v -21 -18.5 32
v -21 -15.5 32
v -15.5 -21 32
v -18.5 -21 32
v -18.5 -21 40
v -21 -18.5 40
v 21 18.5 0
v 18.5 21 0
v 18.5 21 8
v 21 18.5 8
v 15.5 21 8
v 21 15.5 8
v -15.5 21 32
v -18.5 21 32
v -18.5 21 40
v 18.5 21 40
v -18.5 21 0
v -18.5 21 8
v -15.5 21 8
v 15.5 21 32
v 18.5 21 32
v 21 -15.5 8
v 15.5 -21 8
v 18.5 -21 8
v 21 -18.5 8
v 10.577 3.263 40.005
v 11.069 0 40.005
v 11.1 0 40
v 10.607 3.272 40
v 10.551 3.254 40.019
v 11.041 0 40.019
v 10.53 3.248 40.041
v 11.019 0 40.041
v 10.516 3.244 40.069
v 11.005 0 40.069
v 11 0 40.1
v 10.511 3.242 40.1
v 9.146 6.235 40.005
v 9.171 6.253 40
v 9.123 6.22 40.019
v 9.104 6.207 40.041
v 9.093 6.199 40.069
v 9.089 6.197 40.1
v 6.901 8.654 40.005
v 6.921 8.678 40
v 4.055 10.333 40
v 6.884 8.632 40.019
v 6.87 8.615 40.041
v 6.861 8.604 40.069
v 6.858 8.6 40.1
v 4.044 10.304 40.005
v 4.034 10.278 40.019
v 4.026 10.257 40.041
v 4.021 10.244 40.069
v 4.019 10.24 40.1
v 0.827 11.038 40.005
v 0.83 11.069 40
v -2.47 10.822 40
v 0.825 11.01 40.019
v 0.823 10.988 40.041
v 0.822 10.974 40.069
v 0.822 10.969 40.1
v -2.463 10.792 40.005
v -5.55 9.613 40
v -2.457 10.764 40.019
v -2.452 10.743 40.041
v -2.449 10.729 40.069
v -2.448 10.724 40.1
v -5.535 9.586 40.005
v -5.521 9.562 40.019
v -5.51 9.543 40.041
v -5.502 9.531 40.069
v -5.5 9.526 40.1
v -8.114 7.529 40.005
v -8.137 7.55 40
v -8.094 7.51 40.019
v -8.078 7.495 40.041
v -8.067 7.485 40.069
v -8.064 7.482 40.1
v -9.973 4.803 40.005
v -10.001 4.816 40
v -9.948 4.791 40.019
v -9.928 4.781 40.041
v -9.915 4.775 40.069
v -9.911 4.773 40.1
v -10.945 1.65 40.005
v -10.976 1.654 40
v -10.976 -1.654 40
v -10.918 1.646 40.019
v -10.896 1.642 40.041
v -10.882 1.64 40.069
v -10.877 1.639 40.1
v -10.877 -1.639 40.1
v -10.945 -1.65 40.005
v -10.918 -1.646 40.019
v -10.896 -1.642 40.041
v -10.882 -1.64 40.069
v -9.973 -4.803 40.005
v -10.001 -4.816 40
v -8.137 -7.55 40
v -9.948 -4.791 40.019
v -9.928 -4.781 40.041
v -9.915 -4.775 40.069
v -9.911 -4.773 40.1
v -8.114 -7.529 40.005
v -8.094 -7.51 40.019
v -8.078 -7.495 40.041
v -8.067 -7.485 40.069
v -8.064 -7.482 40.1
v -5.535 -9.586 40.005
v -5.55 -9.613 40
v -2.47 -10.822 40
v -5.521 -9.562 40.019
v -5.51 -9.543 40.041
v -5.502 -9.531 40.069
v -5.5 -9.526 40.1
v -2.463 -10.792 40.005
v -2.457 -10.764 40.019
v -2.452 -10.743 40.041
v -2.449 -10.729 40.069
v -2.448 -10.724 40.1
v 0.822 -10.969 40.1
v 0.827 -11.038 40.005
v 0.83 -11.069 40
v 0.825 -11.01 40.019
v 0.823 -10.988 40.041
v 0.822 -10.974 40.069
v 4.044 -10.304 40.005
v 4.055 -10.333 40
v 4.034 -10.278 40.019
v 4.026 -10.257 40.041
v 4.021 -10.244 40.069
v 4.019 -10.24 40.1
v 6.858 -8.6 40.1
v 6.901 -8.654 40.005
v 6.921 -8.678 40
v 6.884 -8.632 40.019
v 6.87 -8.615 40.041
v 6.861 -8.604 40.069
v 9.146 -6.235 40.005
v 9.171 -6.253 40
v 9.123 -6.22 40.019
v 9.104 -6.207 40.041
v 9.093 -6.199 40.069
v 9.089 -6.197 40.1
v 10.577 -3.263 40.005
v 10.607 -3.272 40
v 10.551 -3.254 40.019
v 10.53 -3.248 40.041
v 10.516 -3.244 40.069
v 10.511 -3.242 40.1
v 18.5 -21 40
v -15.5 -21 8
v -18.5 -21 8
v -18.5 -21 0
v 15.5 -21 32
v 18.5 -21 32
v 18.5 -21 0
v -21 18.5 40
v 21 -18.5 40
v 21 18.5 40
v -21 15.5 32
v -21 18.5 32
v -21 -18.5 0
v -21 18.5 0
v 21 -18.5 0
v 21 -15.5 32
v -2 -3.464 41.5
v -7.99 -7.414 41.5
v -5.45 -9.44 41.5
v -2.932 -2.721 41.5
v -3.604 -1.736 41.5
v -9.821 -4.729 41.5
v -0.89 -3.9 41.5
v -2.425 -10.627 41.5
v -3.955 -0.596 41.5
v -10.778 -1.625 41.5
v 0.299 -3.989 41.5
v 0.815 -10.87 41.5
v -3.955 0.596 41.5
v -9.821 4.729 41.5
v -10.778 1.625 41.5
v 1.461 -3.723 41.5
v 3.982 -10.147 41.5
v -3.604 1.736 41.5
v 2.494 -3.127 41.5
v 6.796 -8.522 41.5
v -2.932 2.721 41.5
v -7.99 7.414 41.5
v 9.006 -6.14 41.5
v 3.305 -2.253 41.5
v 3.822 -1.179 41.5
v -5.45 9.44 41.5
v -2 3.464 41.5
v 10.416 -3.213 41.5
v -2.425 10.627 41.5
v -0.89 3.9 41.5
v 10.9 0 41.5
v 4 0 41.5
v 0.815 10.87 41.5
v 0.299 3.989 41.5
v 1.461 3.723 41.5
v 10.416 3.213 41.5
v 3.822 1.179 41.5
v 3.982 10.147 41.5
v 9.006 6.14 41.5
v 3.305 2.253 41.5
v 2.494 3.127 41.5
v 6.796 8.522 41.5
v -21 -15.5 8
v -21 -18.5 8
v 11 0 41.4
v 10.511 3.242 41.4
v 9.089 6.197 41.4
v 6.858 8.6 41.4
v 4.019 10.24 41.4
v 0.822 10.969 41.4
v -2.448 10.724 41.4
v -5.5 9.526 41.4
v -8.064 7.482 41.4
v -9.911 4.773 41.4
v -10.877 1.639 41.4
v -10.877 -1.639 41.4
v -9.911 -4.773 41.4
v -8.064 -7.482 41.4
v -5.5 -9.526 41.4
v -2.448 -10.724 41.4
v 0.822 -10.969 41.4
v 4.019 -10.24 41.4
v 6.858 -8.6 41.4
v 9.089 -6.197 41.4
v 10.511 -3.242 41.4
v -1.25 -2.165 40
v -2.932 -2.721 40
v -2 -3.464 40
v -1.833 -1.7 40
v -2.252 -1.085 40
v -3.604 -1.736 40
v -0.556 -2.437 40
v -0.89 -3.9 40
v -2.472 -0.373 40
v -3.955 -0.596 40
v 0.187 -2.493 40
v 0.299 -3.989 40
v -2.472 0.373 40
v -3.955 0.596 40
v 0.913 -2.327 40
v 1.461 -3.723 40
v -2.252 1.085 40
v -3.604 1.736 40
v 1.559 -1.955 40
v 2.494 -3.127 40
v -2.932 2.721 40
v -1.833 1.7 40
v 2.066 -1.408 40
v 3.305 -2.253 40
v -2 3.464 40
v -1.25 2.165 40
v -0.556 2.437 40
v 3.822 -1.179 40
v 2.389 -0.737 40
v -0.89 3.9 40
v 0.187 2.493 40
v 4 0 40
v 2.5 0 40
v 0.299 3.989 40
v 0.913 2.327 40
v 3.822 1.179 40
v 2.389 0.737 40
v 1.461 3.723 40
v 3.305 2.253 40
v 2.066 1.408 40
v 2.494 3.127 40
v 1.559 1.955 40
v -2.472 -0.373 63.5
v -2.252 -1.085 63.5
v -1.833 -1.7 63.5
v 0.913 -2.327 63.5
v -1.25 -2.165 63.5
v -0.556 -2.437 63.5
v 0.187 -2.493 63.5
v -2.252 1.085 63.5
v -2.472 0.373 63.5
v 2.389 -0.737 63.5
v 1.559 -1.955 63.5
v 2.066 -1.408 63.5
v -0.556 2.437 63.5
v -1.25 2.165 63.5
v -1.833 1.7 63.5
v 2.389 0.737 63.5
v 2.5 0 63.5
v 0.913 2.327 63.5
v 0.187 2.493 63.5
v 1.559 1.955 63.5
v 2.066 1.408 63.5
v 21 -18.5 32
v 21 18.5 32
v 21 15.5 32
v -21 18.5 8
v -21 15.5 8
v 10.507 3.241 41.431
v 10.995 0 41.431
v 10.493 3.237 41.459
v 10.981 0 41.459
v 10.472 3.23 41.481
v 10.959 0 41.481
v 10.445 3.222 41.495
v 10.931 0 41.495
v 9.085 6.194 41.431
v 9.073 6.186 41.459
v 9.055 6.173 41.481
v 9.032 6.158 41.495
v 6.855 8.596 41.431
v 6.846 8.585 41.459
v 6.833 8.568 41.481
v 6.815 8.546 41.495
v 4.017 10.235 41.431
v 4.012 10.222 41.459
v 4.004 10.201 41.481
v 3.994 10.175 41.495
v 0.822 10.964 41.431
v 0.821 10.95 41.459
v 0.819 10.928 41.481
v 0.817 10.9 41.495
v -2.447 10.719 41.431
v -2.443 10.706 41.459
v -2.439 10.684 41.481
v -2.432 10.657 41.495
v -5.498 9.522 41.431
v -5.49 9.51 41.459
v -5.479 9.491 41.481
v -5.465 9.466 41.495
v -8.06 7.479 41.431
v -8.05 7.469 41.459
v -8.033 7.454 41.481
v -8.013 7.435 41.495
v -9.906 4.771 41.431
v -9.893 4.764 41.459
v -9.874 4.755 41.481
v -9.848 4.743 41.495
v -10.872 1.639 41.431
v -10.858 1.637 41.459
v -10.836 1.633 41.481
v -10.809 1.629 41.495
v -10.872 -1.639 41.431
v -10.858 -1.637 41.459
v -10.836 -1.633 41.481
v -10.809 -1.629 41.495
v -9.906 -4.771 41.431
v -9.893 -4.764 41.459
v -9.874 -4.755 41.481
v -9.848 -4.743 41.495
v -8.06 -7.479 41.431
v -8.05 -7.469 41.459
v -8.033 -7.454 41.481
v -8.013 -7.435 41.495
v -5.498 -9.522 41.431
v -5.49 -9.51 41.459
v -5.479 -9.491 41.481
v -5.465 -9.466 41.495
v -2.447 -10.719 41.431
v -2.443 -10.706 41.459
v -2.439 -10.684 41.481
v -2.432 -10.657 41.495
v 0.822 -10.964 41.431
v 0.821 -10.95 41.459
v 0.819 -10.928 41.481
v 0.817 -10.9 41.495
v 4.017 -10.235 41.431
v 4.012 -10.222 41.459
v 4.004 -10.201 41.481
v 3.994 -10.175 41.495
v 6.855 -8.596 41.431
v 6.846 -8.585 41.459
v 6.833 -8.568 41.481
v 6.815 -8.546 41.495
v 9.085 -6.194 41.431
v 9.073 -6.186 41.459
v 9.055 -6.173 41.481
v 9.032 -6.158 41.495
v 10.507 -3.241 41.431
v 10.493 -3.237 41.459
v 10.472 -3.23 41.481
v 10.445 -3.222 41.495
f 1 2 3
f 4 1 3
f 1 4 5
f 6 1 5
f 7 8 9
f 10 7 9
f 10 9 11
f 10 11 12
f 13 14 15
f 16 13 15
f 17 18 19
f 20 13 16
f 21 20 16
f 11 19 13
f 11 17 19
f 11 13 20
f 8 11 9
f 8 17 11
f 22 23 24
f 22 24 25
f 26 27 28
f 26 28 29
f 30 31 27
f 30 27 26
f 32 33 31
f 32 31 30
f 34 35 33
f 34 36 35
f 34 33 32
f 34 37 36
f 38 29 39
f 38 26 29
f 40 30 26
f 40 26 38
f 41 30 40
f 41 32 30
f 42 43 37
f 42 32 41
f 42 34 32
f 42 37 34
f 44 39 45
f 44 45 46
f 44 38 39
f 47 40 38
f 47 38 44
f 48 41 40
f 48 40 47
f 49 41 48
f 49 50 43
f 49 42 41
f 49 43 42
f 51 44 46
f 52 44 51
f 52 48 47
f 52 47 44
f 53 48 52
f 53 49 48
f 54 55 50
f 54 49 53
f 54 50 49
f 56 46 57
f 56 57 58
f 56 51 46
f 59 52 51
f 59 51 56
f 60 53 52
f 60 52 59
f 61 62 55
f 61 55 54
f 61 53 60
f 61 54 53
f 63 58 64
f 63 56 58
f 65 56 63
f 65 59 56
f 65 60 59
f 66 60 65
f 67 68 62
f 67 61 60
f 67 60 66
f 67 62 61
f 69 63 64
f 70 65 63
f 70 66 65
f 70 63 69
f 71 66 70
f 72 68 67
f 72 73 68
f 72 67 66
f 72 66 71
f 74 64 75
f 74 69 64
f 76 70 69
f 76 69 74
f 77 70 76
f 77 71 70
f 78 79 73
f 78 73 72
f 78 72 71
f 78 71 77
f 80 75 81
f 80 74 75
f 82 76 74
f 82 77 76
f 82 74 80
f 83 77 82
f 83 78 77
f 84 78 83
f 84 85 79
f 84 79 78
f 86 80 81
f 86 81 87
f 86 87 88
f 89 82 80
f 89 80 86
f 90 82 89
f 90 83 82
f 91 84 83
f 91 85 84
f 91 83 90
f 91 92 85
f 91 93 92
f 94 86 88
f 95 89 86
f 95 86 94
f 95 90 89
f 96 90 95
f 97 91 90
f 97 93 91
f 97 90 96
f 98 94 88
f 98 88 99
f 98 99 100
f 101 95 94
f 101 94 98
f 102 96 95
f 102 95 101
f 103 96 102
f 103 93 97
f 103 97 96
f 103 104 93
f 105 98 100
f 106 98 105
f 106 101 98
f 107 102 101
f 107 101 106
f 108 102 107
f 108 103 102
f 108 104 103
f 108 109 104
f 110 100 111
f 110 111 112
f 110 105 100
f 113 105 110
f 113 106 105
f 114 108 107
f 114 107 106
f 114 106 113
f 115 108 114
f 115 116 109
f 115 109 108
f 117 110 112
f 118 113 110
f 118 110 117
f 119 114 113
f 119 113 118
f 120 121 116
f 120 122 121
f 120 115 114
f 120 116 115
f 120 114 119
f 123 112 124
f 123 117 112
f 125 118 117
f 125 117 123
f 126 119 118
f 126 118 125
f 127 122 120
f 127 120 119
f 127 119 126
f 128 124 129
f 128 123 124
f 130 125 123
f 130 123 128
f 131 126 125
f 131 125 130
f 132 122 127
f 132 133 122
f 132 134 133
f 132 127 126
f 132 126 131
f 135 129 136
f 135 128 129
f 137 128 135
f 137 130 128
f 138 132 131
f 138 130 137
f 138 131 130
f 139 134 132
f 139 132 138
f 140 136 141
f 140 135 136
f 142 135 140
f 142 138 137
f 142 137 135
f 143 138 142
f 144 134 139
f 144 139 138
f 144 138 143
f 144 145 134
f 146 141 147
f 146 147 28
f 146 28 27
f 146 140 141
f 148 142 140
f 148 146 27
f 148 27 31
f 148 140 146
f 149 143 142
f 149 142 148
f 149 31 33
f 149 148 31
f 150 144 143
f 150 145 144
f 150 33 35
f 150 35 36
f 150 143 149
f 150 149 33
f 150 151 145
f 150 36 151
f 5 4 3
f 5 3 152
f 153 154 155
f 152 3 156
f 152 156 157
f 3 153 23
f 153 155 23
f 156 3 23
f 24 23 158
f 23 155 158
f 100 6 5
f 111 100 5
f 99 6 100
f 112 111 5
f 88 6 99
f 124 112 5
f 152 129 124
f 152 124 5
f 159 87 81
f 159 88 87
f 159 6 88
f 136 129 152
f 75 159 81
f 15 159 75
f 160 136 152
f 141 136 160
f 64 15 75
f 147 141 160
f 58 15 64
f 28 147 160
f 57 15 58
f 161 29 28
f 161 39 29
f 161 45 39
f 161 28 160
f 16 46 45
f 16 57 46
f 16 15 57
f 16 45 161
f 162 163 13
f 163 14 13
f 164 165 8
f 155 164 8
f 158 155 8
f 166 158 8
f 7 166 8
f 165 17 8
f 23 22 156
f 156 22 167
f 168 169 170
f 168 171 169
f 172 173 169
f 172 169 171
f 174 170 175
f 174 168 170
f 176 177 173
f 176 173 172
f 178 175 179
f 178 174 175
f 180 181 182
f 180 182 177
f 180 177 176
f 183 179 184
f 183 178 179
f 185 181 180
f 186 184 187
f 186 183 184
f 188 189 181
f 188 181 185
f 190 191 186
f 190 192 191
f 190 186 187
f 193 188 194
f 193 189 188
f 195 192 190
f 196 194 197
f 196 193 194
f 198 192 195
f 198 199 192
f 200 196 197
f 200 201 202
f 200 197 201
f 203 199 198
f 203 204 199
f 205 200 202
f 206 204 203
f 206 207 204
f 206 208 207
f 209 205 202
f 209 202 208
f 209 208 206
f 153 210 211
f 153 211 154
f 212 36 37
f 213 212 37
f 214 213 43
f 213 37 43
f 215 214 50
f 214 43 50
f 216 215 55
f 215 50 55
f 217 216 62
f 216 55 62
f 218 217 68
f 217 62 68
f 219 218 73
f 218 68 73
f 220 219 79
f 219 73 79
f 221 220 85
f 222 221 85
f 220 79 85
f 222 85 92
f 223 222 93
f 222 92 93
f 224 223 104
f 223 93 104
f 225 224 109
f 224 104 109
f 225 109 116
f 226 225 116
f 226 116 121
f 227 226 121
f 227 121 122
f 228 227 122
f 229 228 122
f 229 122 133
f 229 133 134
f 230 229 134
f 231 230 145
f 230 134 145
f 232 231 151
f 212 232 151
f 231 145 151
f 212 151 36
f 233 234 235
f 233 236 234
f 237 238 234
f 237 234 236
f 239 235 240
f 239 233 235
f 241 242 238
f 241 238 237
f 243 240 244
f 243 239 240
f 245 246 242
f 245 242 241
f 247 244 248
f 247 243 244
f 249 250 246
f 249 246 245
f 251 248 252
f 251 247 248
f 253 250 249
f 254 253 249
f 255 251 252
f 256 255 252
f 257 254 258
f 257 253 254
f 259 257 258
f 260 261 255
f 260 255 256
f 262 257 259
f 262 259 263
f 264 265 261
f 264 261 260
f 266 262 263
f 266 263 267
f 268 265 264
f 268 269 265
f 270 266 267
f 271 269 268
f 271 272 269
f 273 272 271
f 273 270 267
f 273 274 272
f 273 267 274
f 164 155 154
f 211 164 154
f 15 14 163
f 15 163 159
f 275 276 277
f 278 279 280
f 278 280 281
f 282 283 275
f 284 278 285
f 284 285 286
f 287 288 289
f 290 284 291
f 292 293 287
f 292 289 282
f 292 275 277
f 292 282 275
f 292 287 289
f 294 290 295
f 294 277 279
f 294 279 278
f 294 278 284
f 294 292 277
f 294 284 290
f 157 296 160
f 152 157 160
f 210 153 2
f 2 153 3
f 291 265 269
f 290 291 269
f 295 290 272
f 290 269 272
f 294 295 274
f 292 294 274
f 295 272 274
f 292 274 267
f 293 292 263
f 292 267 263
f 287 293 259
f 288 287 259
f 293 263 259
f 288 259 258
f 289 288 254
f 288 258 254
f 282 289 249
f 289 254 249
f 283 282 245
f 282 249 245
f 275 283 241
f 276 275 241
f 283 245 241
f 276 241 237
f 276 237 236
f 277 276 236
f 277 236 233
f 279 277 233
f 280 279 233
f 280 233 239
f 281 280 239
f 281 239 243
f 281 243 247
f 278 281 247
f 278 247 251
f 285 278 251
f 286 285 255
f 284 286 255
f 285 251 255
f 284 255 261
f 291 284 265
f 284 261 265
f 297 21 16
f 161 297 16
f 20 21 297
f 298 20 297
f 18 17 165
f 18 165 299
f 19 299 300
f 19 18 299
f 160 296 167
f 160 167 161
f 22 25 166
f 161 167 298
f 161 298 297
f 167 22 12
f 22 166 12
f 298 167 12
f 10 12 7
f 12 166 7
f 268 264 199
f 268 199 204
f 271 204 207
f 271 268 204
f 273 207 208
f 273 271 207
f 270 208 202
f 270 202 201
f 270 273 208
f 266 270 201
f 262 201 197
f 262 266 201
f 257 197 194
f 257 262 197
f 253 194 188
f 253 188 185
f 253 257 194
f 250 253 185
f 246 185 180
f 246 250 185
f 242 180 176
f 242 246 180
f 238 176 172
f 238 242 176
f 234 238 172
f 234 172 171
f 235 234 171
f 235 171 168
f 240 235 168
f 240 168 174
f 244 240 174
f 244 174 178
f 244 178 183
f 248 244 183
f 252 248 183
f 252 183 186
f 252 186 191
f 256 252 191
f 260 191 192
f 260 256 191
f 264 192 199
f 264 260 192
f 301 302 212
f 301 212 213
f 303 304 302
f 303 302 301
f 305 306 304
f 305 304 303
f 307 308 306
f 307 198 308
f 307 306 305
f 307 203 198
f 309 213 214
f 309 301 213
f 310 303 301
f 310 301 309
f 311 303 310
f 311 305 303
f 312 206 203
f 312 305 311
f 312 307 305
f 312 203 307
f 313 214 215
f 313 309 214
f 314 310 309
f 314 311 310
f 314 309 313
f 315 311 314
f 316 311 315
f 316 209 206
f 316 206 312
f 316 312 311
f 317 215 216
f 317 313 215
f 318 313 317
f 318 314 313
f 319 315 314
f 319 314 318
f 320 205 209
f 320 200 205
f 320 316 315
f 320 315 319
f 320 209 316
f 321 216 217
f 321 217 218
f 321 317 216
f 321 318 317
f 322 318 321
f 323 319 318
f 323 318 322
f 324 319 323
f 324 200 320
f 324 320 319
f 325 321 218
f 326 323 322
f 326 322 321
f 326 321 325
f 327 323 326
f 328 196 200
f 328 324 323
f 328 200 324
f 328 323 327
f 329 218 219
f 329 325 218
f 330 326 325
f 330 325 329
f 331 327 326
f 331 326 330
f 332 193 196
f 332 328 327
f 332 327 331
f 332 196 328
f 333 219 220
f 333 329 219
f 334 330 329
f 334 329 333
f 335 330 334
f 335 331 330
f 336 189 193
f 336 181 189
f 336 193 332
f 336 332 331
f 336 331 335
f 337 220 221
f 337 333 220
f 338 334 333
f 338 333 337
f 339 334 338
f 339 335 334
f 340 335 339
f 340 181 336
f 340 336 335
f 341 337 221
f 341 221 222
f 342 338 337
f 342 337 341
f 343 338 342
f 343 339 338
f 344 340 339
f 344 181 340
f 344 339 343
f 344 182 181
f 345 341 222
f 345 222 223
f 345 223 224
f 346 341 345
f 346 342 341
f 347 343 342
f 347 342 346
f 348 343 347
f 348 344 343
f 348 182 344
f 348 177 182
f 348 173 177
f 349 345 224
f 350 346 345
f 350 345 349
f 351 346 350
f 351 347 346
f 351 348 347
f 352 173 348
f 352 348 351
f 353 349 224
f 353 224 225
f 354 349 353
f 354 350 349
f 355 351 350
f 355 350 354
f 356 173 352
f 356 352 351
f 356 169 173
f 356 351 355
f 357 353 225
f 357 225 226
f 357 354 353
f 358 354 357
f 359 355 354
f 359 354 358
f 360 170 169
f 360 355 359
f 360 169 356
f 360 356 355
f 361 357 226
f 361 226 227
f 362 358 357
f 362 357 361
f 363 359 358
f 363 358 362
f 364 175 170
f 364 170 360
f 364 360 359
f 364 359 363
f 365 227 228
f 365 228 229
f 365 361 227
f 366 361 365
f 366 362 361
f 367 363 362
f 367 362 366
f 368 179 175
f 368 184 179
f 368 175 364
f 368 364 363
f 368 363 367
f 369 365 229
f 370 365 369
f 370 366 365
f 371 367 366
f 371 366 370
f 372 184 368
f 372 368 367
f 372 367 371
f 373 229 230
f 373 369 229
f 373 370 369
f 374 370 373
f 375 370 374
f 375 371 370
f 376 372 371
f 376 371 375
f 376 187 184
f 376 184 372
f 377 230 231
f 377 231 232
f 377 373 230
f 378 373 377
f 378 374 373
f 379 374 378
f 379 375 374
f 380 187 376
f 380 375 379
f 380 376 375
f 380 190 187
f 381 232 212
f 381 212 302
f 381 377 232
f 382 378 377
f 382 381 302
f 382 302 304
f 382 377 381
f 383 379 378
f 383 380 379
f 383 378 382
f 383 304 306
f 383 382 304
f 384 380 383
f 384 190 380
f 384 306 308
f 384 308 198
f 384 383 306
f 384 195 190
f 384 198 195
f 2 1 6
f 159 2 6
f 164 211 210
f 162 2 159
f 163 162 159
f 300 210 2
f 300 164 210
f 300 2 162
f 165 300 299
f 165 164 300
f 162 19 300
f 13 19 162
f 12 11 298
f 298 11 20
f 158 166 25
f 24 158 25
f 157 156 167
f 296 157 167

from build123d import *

# Parameters (mm, degrees)
F0_W      = 42
F0_H      = 42
F1_DEPTH  = 8
F2_DEPTH  = 24
F3_DEPTH  = 8
F4_SIZE   = 2.5
F4_2_SIZE = 2.5
F5_SIZE   = 5.5
F7_R      = 11
F7_R_2    = 4
F8_DEPTH  = 1.5
F9_R      = 2.5
F10_DEPTH = 23.5
F12_R     = 0.1


# Not quite as in the source:
# - a feature names something its author has since deleted; it is built from what else it names


with BuildPart() as f1:
    # F0 (on Top) → F1 (new body)
    with BuildSketch(Plane.XY):
        Rectangle(F0_W, F0_H)
    extrude(amount=F1_DEPTH)


with BuildPart() as f2:
    # F2 (new): a face of the model
    f2_faces = [f1.part.faces().sort_by_distance(p)[0] for p in [
        (0, 0, 8),
    ]]
    extrude(f2_faces, amount=F2_DEPTH)


with BuildPart() as f3:
    # F3 (new): a face of the model
    f3_faces = [f2.part.faces().sort_by_distance(p)[0] for p in [
        (0, 0, 32),
    ]]
    extrude(f3_faces, amount=F3_DEPTH)

    # F4#2
    f4_2_edges = [f3.edges().sort_by_distance(p)[0] for p in [
        (-21, -21, 36),
        (-21, 21, 36),
        (21, 21, 36),
        (21, -21, 36),
    ]]
    chamfer(f4_2_edges, length=F4_2_SIZE)

    # F7 (on face) → F8 (join)
    with BuildSketch(Plane.XY.offset(40)):
        Circle(F7_R)
        Circle(F7_R_2, mode=Mode.SUBTRACT)
    extrude(amount=F8_DEPTH)

    # F9 (on face) → F10 (join)
    with BuildSketch(Plane.XY.offset(40)):
        Circle(F9_R)
    extrude(amount=F10_DEPTH)


with BuildPart() as f1_1:
    add(f1.part)

    # F4
    f4_edges = [f1_1.edges().sort_by_distance(p)[0] for p in [
        (-21, -21, 4),
        (-21, 21, 4),
        (21, 21, 4),
        (21, -21, 4),
    ]]
    chamfer(f4_edges, length=F4_SIZE)


with BuildPart() as f2_1:
    add(f2.part)

    # F5
    f5_edges = [f2_1.edges().sort_by_distance(p)[0] for p in [
        (21, -21, 20),
        (-21, -21, 20),
        (-21, 21, 20),
        (21, 21, 20),
    ]]
    chamfer(f5_edges, length=F5_SIZE)


with BuildPart() as f1_2:
    add(f1_1.part)

    # F11: union F2, F3
    add(f2_1.part)
    add(f3.part)

    # F12
    f12_edges = [f1_2.edges().sort_by_distance(p)[0] for p in [
        (11, 0, 40.75),
        (-11, 0, 40),
        (-11, 0, 41.5),
    ]]
    fillet(f12_edges, radius=F12_R)


solid = f1_2.part
